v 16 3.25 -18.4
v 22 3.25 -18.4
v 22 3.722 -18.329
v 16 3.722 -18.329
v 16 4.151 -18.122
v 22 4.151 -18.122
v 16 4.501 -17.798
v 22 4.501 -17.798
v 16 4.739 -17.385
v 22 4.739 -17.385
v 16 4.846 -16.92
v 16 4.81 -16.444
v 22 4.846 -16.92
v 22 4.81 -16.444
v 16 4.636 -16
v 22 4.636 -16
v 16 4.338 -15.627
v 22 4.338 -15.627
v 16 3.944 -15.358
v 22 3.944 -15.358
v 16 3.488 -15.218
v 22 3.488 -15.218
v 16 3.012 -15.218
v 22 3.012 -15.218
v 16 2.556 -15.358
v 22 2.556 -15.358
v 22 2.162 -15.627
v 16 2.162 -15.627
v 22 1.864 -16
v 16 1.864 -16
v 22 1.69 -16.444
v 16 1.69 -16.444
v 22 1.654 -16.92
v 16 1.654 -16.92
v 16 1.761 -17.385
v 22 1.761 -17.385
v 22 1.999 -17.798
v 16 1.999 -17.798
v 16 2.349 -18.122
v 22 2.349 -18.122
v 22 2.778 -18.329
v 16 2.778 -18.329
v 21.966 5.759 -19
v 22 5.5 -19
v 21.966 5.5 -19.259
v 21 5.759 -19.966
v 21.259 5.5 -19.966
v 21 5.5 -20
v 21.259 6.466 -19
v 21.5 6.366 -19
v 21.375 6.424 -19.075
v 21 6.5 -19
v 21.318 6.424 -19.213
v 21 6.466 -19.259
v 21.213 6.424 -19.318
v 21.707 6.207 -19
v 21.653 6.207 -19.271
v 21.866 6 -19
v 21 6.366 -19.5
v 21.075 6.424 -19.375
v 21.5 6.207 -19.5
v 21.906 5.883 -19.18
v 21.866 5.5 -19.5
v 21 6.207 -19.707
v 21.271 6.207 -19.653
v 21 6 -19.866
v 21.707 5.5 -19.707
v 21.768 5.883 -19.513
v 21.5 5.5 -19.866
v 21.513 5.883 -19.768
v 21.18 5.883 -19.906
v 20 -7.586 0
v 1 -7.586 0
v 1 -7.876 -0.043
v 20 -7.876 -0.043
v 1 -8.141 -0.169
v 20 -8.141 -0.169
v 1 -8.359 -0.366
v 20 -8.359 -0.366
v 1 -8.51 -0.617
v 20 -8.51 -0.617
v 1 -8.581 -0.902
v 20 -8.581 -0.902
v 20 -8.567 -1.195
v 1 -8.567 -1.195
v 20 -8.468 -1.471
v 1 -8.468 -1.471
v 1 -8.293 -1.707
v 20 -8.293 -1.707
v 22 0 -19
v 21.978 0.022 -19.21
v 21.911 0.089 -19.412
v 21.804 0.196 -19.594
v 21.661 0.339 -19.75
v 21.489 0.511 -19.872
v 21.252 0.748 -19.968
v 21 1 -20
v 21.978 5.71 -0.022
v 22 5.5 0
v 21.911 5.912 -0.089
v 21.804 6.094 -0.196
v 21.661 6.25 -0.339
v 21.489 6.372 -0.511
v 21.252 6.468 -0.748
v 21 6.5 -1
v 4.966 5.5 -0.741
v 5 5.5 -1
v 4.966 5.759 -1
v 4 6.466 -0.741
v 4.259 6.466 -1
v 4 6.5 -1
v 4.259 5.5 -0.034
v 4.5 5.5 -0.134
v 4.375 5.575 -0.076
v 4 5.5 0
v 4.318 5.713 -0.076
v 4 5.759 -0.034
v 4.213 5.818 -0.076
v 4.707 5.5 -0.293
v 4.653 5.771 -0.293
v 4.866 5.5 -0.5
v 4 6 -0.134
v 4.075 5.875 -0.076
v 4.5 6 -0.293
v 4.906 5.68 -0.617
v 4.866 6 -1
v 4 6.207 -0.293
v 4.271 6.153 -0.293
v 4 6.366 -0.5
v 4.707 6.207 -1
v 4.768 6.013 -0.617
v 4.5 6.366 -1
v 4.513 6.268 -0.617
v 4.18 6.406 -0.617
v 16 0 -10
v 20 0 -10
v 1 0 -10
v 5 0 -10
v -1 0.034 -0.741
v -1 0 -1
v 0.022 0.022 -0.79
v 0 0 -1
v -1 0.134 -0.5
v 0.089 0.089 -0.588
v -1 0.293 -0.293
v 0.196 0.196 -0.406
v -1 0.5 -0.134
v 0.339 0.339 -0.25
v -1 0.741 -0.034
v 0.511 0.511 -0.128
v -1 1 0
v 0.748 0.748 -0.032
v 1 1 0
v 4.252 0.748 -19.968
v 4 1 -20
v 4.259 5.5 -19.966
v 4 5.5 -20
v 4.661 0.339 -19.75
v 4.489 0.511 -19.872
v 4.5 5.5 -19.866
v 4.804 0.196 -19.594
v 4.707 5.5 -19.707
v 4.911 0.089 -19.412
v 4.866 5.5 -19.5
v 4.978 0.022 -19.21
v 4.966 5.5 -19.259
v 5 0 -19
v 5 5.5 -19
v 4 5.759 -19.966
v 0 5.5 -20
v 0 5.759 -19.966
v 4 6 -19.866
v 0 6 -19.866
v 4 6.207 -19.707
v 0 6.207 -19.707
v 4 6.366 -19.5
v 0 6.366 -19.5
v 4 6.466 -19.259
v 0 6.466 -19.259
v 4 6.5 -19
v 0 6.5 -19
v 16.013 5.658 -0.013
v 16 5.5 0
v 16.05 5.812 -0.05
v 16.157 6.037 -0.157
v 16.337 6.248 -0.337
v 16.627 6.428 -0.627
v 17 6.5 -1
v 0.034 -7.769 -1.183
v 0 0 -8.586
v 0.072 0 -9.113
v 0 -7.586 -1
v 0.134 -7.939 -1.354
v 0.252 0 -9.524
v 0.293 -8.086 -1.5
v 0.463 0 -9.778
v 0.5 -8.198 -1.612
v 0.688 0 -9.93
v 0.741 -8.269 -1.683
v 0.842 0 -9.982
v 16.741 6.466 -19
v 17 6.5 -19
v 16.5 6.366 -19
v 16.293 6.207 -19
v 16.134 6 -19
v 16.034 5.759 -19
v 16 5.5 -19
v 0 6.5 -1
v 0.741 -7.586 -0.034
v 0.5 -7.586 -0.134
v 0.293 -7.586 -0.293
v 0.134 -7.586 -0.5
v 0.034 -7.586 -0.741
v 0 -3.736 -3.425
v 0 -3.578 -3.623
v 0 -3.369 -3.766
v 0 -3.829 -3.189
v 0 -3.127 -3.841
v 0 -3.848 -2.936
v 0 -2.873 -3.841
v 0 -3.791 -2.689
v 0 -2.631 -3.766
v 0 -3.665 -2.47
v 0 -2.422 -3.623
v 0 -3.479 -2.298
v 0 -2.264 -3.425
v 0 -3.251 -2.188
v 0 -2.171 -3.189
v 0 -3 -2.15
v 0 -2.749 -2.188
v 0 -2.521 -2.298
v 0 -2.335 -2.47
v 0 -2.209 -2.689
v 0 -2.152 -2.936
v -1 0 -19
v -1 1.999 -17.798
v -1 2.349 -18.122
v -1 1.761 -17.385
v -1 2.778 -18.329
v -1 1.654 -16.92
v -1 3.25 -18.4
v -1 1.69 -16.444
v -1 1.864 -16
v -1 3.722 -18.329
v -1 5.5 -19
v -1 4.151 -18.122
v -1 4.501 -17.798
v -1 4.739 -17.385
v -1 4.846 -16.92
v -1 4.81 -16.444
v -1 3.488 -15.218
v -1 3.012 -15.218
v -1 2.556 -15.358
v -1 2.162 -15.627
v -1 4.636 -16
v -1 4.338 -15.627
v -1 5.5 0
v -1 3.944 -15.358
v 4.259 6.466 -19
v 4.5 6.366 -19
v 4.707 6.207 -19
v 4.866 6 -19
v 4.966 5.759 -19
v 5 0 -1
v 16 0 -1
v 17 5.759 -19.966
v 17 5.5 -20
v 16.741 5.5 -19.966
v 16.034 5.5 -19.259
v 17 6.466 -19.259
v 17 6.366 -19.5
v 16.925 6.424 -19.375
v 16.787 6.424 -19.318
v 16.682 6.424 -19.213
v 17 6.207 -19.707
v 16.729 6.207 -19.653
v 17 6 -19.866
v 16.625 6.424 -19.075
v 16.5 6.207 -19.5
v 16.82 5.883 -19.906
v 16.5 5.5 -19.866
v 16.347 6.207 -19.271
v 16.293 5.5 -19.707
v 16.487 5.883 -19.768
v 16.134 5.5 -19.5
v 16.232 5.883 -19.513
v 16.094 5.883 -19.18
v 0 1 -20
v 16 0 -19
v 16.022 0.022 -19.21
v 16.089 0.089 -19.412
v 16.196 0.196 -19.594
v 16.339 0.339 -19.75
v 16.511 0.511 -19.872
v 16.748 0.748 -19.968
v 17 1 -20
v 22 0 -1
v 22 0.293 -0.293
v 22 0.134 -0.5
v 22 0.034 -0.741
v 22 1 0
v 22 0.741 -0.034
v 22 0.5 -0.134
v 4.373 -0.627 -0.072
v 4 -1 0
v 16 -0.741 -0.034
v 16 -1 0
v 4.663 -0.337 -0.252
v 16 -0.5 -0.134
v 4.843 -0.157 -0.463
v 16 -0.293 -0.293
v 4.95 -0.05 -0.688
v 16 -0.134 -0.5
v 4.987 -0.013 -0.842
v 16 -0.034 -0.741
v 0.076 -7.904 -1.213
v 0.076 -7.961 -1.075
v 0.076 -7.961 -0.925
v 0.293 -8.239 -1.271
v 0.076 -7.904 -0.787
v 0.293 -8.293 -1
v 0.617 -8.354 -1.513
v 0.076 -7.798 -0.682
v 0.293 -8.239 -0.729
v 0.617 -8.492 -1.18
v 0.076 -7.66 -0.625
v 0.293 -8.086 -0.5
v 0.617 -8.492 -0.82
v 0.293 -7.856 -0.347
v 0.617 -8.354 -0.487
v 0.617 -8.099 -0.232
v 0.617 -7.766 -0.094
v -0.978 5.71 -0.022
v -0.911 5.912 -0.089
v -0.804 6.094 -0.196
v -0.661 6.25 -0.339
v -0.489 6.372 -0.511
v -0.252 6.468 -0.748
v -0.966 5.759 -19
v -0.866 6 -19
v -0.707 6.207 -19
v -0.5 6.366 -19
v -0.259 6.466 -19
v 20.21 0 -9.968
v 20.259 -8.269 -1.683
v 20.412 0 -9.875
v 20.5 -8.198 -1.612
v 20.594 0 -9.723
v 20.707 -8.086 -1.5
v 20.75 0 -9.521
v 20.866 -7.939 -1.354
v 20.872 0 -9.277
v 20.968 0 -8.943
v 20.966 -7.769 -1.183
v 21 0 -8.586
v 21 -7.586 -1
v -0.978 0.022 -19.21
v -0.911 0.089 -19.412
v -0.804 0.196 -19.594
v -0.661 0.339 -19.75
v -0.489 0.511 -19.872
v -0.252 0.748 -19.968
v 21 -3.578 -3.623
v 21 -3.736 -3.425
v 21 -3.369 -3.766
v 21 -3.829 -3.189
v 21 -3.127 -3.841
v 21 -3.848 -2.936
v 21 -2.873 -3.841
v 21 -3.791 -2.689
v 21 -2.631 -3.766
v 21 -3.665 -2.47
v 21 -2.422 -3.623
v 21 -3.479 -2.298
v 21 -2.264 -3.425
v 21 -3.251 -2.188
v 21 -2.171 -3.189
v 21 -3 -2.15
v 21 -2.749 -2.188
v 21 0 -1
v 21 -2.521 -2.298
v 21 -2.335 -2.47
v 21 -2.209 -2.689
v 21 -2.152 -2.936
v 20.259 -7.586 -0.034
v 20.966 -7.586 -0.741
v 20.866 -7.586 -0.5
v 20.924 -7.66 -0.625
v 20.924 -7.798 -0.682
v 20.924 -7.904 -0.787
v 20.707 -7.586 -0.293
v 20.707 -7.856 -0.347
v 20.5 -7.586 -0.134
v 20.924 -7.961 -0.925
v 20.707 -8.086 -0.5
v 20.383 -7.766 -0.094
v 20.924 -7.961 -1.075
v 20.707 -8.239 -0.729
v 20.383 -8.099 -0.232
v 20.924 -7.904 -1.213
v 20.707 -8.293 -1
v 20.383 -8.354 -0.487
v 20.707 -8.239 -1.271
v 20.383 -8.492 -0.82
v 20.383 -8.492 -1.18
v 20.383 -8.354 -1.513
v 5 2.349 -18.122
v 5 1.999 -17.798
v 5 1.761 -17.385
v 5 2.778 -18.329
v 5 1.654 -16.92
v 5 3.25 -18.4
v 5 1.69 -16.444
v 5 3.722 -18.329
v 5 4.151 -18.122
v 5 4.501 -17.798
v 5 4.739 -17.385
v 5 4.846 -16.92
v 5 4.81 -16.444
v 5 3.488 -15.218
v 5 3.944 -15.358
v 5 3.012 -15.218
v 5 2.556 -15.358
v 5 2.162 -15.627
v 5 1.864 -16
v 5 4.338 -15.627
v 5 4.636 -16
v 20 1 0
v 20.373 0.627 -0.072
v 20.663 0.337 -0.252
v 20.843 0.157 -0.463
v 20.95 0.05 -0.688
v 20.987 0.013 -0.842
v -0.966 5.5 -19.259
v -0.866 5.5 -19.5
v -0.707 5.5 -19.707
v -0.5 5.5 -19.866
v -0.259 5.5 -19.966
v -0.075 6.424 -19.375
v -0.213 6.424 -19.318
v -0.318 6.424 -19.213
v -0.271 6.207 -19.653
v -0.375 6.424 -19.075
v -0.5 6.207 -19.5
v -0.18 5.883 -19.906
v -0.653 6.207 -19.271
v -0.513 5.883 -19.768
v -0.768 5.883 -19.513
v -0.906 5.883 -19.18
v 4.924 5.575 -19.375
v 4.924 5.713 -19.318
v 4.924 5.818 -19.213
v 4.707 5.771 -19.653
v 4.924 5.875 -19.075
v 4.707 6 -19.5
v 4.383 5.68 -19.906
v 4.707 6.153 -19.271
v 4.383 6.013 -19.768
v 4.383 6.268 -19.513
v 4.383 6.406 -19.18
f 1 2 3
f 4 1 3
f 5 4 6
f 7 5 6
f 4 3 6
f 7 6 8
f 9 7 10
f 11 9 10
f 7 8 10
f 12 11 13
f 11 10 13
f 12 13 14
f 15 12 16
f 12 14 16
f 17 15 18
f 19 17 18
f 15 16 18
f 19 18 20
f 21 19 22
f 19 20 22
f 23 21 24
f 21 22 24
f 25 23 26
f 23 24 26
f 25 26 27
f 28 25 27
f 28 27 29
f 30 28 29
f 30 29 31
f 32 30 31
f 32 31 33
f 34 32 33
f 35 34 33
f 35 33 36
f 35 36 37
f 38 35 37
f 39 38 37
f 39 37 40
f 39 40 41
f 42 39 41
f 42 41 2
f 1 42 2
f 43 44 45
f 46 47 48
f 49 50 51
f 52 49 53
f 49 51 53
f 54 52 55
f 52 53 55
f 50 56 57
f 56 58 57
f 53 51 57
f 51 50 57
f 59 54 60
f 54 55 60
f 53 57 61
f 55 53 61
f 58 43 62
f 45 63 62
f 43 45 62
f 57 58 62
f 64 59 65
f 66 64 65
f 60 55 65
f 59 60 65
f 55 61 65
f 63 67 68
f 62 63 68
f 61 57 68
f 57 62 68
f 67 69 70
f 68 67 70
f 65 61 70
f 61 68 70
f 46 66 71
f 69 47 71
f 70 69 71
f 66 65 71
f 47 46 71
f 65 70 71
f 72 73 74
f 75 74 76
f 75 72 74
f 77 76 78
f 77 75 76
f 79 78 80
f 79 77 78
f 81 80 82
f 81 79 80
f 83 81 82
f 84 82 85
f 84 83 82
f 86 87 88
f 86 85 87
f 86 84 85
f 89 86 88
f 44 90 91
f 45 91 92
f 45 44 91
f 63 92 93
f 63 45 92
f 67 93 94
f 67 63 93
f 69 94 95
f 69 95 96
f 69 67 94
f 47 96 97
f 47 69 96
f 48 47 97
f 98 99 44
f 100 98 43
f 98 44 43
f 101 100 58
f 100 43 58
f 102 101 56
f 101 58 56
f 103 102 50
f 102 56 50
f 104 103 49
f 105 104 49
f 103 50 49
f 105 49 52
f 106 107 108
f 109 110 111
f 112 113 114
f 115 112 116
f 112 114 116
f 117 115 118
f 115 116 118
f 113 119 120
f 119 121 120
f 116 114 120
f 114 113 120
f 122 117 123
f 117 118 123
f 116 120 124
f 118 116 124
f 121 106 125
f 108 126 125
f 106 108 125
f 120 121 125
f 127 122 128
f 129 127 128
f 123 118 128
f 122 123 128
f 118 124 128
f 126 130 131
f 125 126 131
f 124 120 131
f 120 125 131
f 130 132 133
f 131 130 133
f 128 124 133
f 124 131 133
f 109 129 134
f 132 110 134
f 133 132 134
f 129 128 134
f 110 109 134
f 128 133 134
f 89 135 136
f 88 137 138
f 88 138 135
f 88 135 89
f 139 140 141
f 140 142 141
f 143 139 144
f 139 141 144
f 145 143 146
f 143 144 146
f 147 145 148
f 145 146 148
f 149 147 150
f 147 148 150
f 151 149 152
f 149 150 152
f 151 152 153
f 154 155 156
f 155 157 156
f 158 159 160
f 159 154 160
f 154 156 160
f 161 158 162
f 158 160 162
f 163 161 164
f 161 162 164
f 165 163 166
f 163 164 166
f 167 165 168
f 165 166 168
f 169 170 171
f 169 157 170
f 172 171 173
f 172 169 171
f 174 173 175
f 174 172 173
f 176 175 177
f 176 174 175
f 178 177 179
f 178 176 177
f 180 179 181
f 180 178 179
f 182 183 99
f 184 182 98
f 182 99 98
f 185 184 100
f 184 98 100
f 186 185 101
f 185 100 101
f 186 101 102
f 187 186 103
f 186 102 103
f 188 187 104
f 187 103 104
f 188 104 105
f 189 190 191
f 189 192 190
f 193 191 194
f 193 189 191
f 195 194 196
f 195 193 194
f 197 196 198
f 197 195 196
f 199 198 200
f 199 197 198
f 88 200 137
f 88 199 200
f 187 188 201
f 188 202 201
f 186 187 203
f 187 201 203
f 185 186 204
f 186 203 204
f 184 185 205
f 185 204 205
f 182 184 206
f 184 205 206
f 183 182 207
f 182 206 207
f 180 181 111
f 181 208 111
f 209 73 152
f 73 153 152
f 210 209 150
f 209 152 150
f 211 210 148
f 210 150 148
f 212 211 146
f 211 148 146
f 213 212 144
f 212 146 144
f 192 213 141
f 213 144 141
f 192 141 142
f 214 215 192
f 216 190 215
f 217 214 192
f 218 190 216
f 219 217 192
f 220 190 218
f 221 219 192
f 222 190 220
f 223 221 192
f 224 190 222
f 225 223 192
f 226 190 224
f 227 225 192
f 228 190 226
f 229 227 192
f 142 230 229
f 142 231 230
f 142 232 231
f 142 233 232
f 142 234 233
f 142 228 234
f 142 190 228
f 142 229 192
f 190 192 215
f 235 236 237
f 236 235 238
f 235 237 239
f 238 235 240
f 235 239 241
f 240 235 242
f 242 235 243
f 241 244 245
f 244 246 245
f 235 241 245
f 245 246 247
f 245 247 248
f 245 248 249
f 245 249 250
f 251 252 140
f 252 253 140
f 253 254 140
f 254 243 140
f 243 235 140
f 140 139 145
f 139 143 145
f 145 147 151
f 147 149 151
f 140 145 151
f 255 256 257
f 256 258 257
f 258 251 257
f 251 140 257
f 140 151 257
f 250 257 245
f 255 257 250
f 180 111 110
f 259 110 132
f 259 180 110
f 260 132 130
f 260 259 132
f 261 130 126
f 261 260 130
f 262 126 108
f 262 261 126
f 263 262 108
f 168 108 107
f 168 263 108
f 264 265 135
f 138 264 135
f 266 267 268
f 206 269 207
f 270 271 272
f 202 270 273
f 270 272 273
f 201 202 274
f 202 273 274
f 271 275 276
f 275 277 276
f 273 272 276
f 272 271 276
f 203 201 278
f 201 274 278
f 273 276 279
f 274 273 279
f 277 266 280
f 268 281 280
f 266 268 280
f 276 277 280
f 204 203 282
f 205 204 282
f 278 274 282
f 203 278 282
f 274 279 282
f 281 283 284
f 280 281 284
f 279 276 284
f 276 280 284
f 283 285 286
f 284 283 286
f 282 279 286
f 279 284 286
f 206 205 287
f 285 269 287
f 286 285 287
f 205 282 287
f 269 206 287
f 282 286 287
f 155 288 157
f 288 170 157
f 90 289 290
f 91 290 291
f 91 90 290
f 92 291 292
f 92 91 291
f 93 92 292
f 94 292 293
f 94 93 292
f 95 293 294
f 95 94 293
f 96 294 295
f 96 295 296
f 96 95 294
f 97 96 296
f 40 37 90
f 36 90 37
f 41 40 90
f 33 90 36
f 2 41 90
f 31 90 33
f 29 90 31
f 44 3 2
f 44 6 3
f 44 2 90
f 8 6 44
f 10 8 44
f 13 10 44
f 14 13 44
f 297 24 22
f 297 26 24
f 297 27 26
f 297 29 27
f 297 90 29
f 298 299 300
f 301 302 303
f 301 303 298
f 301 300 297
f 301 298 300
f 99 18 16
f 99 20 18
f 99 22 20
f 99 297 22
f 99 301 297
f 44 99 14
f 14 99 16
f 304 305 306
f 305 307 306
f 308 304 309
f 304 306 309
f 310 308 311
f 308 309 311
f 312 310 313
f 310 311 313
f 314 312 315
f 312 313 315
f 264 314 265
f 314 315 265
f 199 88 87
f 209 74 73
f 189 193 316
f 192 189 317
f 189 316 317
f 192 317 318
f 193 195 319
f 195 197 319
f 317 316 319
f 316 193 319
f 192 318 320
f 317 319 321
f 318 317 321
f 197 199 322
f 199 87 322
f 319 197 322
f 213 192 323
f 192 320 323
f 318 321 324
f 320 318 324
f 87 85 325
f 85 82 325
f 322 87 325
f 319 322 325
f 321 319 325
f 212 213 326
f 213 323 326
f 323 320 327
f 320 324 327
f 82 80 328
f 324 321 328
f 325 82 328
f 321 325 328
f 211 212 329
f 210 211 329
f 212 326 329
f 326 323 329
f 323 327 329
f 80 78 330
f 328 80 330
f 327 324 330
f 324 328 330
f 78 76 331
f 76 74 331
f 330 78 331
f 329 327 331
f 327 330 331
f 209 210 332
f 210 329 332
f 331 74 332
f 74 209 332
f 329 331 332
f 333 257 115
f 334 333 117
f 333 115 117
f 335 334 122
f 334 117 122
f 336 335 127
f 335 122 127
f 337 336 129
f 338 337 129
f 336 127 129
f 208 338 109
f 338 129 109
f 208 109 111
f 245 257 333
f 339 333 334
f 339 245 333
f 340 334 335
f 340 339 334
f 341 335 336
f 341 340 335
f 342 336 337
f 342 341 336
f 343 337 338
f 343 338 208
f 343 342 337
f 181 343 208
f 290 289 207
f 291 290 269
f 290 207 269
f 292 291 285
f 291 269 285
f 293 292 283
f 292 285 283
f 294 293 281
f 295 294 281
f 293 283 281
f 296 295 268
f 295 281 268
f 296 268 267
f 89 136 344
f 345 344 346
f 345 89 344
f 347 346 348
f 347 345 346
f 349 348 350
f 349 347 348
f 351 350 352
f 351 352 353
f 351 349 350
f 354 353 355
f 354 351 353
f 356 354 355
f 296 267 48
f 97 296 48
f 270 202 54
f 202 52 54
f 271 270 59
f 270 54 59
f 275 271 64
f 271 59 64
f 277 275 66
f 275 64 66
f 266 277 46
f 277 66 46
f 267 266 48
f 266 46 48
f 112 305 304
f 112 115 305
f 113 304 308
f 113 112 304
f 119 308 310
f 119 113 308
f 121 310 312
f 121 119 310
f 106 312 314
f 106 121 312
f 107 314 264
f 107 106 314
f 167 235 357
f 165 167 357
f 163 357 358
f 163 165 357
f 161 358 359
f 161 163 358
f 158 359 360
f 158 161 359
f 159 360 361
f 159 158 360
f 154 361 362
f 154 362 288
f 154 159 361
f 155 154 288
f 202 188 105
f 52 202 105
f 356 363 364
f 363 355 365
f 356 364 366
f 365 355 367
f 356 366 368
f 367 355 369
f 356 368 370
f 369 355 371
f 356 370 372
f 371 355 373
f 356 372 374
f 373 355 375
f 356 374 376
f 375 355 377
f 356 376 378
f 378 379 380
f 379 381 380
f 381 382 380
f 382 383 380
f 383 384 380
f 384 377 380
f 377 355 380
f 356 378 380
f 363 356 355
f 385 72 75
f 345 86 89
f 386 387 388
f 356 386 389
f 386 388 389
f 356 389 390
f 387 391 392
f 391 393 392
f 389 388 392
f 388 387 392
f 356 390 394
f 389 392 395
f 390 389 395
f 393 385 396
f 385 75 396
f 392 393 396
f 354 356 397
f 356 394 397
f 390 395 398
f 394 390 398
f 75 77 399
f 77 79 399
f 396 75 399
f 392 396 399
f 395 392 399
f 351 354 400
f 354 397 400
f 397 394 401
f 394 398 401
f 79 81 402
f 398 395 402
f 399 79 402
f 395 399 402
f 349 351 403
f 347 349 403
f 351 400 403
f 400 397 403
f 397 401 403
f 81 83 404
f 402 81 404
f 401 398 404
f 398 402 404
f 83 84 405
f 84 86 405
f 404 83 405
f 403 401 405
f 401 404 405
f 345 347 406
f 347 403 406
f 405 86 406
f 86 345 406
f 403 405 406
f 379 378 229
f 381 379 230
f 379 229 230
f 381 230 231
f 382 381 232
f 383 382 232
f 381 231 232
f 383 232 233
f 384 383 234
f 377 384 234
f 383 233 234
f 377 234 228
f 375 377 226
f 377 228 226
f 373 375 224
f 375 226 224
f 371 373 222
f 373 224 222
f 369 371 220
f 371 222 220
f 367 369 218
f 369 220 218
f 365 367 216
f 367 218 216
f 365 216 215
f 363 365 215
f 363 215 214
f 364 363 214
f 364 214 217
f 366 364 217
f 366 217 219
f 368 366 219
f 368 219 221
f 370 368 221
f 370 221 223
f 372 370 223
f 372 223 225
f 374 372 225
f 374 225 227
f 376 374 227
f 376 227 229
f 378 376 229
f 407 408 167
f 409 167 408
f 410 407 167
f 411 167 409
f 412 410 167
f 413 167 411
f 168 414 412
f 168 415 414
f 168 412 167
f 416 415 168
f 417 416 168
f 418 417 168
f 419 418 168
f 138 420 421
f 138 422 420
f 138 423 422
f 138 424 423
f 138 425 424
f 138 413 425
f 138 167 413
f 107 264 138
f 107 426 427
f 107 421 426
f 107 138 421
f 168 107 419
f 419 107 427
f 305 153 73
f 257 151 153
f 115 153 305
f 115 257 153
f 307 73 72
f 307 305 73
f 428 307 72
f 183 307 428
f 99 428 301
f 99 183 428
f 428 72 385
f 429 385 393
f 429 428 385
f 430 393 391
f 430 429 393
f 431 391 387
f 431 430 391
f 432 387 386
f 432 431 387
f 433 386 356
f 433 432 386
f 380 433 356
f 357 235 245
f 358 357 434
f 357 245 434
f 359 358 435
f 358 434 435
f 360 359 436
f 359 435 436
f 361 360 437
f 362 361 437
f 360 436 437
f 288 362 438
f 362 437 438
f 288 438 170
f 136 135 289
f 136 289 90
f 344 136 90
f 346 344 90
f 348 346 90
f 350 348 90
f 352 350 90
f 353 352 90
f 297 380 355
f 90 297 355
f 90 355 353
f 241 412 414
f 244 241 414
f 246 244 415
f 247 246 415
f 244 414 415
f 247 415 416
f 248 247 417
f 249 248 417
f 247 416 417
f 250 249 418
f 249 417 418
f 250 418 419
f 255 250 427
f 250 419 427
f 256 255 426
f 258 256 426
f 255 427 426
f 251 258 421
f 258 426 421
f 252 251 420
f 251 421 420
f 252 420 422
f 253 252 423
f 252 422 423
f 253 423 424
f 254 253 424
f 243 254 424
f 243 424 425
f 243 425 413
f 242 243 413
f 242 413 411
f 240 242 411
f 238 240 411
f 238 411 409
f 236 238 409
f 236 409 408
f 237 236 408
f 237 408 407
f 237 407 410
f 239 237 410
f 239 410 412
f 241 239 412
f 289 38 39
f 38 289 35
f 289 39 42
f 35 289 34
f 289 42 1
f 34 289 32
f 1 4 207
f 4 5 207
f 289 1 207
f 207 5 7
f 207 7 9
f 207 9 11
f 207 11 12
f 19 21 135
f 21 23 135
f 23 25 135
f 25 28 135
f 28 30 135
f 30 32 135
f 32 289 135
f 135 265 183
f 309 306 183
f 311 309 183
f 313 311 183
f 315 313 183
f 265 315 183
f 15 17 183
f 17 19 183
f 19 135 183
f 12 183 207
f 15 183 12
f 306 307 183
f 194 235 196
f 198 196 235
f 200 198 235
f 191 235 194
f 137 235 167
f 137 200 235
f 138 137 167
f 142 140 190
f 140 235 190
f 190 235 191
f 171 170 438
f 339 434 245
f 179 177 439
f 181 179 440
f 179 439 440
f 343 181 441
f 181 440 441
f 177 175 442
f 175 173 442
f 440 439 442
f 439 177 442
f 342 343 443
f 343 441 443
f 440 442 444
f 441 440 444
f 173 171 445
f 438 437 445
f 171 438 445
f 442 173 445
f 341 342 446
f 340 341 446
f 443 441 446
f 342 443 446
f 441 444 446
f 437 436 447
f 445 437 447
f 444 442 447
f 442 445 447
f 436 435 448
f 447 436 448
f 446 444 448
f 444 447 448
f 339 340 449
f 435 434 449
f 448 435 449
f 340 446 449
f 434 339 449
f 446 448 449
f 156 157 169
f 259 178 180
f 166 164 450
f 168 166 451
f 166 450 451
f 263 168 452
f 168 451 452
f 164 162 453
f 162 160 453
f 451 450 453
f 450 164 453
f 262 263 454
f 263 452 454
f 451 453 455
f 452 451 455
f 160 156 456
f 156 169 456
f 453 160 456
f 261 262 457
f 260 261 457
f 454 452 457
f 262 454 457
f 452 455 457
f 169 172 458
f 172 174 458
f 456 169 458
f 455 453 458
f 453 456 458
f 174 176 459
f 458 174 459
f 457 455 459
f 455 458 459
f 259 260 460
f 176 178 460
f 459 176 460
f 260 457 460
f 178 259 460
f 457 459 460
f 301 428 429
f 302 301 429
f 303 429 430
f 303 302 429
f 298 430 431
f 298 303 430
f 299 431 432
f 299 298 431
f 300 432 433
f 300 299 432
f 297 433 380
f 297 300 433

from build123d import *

# Parameters (mm, degrees)
BODY_DEPTH          = 21
SKETCH2_R           = 0.85
BOLT_HOLE_DEPTH     = 22
SKETCH3_W           = 6
SKETCH3_H           = 6.5
BOSS_EXTRUDE1_DEPTH = 20
SKETCH4_R           = 1.6
CUT_EXTRUDE1_DEPTH  = 24
EDGE_FILLETS_R      = 1


with BuildPart() as part:
    # Sketch1 → body (new body)
    with BuildSketch(Plane(origin=(0, 0, 0), x_dir=(0, 0, -1), z_dir=(1, 0, 0))):
        Polygon((0, 0), (10, 0), (0, -10), align=None)
    extrude(amount=BODY_DEPTH)

    # Sketch2 → bolt_hole (cut, through all)
    with BuildSketch(Plane.ZY):
        with Locations((-3, -3)):
            Circle(SKETCH2_R)
    extrude(amount=-BOLT_HOLE_DEPTH, mode=Mode.SUBTRACT)

    # Sketch3 → Boss-Extrude1 (add)
    with BuildSketch(Plane.XY):
        with Locations((2, 3.25)):
            Rectangle(SKETCH3_W, SKETCH3_H)
        with Locations((19, 3.25)):
            Rectangle(SKETCH3_W, SKETCH3_H)
    extrude(amount=-BOSS_EXTRUDE1_DEPTH)

    # Sketch4 → Cut-Extrude1 (cut, through all)
    with BuildSketch(Plane(origin=(22, 0, 0), x_dir=(0, 0, -1), z_dir=(1, 0, 0))):
        with Locations((16.8, 3.25)):
            Circle(SKETCH4_R)
    extrude(amount=-CUT_EXTRUDE1_DEPTH, mode=Mode.SUBTRACT)

    # edge_fillets
    edge_fillets_edges = [part.edges().sort_by_distance(p)[0] for p in [
        (21, -5, 0),
        (21, -5, -5),
        (2, 0, -20),
        (-1, 3.25, -20),
        (2, 6.5, -20),
        (-1, 6.5, -10),
        (5, 3.25, -20),
        (5, 6.5, -10),
        (-0.5, 0, 0),
        (5, 3.25, 0),
        (2, 6.5, 0),
        (10.5, 0, 0),
        (22, 3.25, -20),
        (22, 6.5, -10),
        (19, 0, -20),
        (16, 3.25, -20),
        (19, 6.5, -20),
        (16, 6.5, -10),
        (19, 6.5, 0),
        (21.5, 0, 0),
        (0, -5, -5),
        (0, -5, 0),
        (10.5, -10, 0),
    ]]
    fillet(edge_fillets_edges, radius=EDGE_FILLETS_R)


solid = part.part
